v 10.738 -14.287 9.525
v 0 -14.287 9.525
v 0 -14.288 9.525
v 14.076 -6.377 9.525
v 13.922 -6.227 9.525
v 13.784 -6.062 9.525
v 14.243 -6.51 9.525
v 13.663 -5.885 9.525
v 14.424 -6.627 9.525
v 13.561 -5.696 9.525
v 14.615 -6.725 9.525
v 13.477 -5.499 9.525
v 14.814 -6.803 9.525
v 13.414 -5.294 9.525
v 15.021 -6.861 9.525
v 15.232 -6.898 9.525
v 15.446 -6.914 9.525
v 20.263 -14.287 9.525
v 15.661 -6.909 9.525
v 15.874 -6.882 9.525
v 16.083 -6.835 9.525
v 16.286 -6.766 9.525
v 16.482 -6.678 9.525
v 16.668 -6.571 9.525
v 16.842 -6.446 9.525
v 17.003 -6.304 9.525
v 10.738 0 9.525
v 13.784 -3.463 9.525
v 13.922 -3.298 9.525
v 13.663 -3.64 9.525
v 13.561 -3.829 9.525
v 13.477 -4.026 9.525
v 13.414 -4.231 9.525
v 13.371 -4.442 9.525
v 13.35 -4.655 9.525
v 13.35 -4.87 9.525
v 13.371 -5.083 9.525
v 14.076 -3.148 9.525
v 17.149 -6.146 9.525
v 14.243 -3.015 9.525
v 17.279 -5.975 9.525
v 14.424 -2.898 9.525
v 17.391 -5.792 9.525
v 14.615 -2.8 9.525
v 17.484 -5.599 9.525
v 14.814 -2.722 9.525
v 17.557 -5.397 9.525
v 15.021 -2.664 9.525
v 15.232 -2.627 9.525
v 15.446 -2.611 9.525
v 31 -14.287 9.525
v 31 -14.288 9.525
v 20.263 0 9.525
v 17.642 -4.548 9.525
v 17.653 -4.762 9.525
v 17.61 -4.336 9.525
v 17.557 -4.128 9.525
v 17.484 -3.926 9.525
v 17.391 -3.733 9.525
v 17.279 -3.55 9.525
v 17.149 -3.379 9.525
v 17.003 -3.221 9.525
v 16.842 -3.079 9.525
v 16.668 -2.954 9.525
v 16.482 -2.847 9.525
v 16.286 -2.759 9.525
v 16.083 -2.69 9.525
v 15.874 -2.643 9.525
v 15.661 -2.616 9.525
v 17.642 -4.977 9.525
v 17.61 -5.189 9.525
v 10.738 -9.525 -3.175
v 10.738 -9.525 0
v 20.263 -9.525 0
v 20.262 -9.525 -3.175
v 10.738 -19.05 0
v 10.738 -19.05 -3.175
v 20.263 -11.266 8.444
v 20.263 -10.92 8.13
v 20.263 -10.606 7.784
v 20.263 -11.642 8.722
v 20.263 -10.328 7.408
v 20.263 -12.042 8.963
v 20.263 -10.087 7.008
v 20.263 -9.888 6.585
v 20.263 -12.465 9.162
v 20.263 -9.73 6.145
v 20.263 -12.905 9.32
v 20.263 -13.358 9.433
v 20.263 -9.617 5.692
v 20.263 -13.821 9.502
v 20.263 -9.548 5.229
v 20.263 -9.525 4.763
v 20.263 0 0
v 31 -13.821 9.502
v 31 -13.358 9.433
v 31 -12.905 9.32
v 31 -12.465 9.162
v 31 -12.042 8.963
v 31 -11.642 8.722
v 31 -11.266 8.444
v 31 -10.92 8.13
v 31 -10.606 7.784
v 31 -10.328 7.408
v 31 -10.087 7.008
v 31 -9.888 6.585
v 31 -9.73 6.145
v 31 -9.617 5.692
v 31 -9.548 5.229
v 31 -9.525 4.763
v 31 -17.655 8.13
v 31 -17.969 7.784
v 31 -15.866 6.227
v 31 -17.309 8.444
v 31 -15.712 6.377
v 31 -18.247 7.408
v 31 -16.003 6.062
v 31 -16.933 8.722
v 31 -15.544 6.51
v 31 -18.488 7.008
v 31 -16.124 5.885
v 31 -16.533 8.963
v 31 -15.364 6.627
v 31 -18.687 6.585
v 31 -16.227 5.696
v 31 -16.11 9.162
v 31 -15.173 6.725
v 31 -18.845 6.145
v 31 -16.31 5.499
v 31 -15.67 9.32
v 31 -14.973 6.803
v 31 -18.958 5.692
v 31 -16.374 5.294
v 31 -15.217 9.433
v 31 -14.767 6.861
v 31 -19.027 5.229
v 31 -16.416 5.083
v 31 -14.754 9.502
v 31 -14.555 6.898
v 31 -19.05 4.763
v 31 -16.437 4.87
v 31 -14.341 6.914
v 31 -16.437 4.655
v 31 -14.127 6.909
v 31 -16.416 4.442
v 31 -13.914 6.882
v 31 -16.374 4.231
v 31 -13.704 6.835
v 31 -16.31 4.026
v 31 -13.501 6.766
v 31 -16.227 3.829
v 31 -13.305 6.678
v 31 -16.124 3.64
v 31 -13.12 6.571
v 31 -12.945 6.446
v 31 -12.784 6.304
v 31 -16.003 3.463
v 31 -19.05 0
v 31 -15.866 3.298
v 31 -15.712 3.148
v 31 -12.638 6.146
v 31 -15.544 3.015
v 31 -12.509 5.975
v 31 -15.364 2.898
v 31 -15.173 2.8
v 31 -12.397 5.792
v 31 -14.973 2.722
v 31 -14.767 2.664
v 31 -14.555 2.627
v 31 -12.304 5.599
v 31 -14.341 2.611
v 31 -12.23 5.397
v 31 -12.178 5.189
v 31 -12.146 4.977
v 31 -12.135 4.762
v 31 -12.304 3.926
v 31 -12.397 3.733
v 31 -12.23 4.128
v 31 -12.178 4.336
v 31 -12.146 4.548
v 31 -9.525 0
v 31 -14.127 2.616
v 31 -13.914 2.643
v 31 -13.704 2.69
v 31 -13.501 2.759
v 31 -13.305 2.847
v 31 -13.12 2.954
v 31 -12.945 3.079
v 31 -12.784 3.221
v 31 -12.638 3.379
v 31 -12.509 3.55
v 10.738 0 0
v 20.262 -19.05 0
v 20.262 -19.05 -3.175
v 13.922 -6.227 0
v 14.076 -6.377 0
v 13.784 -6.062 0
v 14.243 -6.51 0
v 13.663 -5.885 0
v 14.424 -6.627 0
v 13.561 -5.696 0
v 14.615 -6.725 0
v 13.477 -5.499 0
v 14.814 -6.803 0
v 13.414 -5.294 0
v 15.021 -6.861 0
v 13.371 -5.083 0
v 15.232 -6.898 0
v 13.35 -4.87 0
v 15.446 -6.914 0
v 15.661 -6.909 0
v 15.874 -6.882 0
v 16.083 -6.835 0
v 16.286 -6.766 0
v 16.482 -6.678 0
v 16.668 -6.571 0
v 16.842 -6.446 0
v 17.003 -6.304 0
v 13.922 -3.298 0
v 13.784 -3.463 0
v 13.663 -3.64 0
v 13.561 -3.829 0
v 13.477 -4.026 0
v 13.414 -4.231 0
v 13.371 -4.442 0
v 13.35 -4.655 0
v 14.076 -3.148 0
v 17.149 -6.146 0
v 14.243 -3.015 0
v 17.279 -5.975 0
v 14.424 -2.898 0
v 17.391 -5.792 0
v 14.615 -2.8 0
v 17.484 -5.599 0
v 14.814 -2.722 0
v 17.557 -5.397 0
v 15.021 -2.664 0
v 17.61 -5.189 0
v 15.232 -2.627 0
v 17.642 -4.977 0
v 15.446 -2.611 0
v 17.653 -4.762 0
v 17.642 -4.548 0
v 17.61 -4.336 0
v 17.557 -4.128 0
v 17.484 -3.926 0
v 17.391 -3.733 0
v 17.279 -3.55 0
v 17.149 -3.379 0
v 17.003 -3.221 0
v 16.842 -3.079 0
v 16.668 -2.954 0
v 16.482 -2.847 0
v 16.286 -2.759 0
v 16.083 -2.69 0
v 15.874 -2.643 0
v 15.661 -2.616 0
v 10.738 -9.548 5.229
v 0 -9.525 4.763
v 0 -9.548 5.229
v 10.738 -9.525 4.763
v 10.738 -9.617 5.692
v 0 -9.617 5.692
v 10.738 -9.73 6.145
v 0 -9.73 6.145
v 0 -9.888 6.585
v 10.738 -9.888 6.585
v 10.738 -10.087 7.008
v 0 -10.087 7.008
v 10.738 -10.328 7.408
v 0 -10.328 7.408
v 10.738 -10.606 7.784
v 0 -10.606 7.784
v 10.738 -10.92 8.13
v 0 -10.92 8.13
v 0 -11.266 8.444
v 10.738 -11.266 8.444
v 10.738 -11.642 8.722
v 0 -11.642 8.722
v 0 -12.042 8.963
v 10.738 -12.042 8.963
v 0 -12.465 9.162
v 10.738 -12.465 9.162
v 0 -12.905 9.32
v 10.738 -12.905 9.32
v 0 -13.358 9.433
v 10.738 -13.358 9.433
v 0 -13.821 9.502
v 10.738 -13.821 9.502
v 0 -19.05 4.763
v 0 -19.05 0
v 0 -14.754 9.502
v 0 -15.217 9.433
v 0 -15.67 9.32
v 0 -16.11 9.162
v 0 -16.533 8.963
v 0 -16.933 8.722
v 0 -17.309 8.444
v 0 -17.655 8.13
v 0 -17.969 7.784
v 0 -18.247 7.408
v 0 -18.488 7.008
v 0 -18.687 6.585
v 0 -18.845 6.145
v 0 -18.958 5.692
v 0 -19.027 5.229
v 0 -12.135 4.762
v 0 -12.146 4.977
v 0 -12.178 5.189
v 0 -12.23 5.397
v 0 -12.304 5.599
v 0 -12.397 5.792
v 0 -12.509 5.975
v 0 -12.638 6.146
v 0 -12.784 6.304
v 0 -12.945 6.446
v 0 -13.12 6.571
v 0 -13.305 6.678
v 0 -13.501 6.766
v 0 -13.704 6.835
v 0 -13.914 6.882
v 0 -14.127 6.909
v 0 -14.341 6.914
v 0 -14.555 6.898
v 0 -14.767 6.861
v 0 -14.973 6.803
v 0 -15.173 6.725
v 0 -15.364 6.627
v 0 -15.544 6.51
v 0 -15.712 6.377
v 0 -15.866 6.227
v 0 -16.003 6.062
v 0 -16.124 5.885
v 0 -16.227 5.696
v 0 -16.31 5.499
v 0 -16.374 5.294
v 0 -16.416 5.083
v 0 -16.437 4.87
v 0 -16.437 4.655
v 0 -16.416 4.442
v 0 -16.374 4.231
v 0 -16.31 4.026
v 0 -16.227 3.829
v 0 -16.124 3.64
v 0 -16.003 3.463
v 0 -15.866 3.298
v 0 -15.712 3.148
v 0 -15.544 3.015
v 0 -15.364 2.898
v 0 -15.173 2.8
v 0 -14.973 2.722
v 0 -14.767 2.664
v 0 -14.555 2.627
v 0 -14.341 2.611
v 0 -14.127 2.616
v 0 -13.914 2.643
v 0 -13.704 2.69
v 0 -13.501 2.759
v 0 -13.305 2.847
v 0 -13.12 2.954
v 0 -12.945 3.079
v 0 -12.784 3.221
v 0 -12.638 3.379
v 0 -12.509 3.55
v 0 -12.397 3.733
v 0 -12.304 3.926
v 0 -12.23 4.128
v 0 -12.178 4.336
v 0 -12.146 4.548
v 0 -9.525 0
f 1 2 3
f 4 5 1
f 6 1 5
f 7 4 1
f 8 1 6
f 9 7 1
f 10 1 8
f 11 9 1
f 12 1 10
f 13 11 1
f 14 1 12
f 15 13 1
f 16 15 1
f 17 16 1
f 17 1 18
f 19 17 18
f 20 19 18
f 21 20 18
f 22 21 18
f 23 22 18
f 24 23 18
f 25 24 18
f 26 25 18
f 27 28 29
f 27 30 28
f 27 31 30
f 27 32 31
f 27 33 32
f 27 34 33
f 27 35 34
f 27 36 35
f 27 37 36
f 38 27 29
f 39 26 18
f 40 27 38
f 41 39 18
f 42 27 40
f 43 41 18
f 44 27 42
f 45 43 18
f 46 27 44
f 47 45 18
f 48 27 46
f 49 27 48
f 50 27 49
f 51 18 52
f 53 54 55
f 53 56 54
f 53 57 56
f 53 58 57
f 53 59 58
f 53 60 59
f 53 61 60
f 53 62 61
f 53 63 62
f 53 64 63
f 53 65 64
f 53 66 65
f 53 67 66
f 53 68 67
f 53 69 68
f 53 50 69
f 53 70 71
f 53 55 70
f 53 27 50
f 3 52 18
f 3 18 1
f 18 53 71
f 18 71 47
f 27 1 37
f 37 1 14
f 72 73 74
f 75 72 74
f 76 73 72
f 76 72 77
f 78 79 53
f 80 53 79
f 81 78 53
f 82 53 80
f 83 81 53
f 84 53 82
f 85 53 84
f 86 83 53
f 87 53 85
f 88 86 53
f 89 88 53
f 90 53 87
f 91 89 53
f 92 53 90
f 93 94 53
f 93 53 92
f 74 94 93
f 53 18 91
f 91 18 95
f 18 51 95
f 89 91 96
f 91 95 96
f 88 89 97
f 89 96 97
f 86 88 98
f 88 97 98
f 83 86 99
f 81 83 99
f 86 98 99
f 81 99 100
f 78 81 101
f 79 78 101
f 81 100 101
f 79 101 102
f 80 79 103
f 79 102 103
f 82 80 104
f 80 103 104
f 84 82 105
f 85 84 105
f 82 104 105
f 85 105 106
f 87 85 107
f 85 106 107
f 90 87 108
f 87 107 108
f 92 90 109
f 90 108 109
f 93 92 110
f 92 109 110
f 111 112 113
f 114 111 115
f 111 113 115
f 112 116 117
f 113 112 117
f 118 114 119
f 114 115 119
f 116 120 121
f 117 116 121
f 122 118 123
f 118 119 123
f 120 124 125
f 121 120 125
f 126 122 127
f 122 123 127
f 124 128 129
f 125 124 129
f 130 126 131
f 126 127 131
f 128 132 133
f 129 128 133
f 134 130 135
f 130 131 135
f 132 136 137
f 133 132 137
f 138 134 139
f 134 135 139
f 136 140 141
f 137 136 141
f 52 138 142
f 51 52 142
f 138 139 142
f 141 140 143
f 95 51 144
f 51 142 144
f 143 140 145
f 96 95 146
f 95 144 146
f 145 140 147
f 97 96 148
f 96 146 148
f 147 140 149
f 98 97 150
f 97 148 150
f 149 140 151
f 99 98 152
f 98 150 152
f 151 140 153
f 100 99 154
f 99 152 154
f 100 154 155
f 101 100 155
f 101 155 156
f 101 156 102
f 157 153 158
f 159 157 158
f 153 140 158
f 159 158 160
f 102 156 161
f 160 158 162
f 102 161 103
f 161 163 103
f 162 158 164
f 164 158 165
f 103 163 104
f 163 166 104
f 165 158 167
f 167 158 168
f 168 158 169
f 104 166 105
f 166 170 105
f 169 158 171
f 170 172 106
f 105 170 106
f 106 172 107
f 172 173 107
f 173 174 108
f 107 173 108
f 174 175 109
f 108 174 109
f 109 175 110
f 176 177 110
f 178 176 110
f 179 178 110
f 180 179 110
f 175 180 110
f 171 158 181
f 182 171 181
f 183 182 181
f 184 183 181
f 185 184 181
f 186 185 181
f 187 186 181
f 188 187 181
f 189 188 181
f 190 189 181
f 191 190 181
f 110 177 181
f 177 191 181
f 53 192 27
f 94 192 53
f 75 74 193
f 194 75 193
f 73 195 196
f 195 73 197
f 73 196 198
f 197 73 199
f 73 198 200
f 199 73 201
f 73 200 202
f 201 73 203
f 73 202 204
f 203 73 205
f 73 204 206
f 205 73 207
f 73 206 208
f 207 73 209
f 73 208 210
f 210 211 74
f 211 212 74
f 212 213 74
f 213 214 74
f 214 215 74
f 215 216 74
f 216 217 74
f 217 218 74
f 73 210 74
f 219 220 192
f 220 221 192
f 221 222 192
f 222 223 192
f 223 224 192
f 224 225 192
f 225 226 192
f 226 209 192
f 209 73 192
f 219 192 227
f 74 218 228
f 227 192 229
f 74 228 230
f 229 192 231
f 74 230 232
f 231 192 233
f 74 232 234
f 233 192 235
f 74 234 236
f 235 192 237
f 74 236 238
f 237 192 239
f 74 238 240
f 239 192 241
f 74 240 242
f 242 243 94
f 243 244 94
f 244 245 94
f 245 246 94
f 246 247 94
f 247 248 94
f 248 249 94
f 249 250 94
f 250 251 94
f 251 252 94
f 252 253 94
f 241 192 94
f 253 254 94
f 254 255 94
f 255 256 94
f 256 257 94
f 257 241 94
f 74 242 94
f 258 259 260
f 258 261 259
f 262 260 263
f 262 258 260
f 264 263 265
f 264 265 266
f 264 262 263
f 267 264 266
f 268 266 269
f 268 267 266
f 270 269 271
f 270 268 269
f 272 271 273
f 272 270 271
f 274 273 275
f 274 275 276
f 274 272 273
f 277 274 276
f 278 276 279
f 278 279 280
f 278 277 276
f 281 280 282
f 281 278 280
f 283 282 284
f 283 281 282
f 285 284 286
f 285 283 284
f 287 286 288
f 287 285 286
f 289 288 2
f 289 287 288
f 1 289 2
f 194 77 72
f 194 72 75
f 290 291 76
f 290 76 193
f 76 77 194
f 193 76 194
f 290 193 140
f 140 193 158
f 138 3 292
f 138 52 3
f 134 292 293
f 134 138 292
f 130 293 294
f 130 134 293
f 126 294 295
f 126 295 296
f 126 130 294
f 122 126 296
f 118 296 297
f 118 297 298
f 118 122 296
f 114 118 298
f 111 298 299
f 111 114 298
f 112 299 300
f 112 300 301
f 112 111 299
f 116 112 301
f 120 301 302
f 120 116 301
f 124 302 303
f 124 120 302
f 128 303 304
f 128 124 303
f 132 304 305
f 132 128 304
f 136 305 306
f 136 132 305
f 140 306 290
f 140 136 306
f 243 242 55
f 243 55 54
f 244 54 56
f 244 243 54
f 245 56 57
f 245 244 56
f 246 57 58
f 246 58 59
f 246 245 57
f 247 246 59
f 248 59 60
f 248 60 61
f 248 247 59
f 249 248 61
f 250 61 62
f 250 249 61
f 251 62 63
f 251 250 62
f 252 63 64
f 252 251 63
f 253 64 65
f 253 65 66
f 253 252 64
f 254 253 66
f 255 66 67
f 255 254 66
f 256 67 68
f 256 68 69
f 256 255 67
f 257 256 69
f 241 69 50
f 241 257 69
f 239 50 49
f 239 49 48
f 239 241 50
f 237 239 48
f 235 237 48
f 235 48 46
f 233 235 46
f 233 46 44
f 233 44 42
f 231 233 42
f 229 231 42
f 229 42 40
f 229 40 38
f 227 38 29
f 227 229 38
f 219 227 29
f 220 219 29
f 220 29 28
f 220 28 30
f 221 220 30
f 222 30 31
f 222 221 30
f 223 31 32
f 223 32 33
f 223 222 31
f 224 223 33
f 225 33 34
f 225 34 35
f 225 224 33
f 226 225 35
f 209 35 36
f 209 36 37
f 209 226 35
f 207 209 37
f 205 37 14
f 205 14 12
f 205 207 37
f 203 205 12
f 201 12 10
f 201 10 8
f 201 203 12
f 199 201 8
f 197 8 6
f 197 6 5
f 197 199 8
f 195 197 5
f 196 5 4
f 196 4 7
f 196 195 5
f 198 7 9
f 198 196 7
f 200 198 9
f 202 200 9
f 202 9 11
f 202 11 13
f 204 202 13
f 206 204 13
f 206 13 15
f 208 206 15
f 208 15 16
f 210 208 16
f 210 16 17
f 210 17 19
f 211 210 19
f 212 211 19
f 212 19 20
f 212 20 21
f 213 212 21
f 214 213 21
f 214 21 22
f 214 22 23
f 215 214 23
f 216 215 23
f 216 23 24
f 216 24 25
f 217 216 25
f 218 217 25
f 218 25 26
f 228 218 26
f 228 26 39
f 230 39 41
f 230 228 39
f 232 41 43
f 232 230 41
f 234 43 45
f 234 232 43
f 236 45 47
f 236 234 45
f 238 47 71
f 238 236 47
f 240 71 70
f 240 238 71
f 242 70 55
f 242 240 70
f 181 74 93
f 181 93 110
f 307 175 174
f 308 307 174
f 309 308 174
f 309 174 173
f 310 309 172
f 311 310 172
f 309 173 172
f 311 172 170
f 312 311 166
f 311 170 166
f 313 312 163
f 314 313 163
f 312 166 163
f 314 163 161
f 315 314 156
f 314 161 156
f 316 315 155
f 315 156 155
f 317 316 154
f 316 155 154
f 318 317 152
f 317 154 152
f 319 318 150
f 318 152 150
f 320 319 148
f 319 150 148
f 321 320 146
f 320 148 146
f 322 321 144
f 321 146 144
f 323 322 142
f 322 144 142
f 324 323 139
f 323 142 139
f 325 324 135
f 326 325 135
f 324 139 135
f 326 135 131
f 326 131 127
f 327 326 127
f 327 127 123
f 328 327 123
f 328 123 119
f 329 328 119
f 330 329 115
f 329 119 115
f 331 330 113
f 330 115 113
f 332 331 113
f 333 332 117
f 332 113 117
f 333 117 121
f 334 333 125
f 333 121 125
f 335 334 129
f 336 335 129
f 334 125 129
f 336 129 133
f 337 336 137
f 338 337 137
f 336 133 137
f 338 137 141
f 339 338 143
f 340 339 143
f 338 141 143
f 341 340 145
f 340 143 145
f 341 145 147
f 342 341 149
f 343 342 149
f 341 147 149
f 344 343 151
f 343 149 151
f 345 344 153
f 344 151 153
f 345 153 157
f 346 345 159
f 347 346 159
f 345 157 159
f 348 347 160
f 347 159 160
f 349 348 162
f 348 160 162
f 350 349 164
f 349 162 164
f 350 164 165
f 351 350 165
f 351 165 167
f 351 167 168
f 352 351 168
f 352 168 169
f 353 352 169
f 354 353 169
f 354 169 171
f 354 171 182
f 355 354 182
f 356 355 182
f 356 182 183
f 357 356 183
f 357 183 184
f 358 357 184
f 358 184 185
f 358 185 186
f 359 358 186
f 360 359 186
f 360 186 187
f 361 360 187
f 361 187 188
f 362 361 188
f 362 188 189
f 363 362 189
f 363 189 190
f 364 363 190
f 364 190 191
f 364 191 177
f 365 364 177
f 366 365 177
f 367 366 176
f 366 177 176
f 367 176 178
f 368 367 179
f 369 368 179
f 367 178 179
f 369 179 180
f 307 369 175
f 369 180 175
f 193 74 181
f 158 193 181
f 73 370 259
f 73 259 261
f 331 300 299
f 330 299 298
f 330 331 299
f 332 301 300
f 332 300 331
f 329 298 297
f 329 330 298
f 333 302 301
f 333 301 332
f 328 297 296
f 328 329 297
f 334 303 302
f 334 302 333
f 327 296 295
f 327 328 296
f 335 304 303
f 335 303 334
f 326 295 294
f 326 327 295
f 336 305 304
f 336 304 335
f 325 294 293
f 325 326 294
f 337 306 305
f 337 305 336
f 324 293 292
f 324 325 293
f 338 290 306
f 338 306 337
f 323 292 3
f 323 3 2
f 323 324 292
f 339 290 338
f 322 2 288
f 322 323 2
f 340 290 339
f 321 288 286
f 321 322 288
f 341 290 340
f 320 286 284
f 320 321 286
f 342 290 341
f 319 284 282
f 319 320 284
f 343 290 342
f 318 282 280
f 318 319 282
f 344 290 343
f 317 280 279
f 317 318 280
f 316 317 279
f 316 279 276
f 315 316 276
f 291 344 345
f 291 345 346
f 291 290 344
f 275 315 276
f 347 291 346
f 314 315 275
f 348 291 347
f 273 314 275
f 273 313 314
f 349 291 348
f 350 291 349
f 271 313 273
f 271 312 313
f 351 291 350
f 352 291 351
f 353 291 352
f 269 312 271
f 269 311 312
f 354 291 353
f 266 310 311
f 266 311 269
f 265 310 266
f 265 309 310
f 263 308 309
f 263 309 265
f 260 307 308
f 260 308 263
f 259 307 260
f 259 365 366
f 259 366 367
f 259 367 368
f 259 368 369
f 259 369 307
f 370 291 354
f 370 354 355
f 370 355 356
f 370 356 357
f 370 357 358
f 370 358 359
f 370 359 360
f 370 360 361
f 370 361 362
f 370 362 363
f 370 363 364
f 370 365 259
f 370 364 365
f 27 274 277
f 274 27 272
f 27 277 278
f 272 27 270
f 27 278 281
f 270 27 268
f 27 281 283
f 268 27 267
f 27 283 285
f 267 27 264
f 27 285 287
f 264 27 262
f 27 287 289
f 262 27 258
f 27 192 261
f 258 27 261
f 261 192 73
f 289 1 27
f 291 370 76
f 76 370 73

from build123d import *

# Parameters (mm, degrees)
F0_W     = 31
F0_H     = 19.05
F0_R     = 2.15265
F1_DEPTH = 9.525
F2_R     = 2.15265
F3_DEPTH = 31
F4_W     = 9.525
F4_H     = 9.525
F5_DEPTH = 3.175
F6_W     = 10.7375
F6_H     = 9.525
F7_DEPTH = 9.525
F8_R     = 4.76249


# Not quite as in the source:
# - a fillet or chamfer is up to 0.001 mm smaller than in the source, because OpenCascade refuses the exact size


with BuildPart() as f1:
    # F0 (on Top) → F1 (new body)
    with BuildSketch(Plane.XY):
        with Locations((15.5, -9.525)):
            Rectangle(F0_W, F0_H)
        with Locations((15.5, -4.7625)):
            Circle(F0_R, mode=Mode.SUBTRACT)
    extrude(amount=F1_DEPTH)

    # F2 (on face) → F3 (cut, through all)
    with BuildSketch(Plane.YZ.offset(31)):
        with Locations((-14.2875, 4.7625)):
            Circle(F2_R)
    extrude(amount=-F3_DEPTH, mode=Mode.SUBTRACT)

    # F4 (on face) → F5 (join)
    with BuildSketch(Plane(origin=(0, 0, 0), x_dir=(1, 0, 0), z_dir=(0, 0, -1))):
        with Locations((15.5, 14.2875)):
            Rectangle(F4_W, F4_H)
    extrude(amount=F5_DEPTH)

    # F6 (on face) → F7 (cut, through all)
    with BuildSketch(Plane(origin=(0, 0, 0), x_dir=(1, 0, 0), z_dir=(0, 0, -1))):
        with Locations((25.63125, 4.7625)):
            Rectangle(F6_W, F6_H)
        with Locations((5.36875, 4.7625)):
            Rectangle(F6_W, F6_H)
    extrude(amount=-F7_DEPTH, mode=Mode.SUBTRACT)

    # F8 (radius 4.7625 in the source; OpenCascade refuses exactly that, so slightly less here)
    f8_edges = [f1.edges().sort_by_distance(p)[0] for p in [
        (15.5, -19.05, 9.525),
        (25.63125, -9.525, 9.525),
        (5.36875, -9.525, 9.525),
    ]]
    fillet(f8_edges, radius=F8_R)


solid = f1.part
